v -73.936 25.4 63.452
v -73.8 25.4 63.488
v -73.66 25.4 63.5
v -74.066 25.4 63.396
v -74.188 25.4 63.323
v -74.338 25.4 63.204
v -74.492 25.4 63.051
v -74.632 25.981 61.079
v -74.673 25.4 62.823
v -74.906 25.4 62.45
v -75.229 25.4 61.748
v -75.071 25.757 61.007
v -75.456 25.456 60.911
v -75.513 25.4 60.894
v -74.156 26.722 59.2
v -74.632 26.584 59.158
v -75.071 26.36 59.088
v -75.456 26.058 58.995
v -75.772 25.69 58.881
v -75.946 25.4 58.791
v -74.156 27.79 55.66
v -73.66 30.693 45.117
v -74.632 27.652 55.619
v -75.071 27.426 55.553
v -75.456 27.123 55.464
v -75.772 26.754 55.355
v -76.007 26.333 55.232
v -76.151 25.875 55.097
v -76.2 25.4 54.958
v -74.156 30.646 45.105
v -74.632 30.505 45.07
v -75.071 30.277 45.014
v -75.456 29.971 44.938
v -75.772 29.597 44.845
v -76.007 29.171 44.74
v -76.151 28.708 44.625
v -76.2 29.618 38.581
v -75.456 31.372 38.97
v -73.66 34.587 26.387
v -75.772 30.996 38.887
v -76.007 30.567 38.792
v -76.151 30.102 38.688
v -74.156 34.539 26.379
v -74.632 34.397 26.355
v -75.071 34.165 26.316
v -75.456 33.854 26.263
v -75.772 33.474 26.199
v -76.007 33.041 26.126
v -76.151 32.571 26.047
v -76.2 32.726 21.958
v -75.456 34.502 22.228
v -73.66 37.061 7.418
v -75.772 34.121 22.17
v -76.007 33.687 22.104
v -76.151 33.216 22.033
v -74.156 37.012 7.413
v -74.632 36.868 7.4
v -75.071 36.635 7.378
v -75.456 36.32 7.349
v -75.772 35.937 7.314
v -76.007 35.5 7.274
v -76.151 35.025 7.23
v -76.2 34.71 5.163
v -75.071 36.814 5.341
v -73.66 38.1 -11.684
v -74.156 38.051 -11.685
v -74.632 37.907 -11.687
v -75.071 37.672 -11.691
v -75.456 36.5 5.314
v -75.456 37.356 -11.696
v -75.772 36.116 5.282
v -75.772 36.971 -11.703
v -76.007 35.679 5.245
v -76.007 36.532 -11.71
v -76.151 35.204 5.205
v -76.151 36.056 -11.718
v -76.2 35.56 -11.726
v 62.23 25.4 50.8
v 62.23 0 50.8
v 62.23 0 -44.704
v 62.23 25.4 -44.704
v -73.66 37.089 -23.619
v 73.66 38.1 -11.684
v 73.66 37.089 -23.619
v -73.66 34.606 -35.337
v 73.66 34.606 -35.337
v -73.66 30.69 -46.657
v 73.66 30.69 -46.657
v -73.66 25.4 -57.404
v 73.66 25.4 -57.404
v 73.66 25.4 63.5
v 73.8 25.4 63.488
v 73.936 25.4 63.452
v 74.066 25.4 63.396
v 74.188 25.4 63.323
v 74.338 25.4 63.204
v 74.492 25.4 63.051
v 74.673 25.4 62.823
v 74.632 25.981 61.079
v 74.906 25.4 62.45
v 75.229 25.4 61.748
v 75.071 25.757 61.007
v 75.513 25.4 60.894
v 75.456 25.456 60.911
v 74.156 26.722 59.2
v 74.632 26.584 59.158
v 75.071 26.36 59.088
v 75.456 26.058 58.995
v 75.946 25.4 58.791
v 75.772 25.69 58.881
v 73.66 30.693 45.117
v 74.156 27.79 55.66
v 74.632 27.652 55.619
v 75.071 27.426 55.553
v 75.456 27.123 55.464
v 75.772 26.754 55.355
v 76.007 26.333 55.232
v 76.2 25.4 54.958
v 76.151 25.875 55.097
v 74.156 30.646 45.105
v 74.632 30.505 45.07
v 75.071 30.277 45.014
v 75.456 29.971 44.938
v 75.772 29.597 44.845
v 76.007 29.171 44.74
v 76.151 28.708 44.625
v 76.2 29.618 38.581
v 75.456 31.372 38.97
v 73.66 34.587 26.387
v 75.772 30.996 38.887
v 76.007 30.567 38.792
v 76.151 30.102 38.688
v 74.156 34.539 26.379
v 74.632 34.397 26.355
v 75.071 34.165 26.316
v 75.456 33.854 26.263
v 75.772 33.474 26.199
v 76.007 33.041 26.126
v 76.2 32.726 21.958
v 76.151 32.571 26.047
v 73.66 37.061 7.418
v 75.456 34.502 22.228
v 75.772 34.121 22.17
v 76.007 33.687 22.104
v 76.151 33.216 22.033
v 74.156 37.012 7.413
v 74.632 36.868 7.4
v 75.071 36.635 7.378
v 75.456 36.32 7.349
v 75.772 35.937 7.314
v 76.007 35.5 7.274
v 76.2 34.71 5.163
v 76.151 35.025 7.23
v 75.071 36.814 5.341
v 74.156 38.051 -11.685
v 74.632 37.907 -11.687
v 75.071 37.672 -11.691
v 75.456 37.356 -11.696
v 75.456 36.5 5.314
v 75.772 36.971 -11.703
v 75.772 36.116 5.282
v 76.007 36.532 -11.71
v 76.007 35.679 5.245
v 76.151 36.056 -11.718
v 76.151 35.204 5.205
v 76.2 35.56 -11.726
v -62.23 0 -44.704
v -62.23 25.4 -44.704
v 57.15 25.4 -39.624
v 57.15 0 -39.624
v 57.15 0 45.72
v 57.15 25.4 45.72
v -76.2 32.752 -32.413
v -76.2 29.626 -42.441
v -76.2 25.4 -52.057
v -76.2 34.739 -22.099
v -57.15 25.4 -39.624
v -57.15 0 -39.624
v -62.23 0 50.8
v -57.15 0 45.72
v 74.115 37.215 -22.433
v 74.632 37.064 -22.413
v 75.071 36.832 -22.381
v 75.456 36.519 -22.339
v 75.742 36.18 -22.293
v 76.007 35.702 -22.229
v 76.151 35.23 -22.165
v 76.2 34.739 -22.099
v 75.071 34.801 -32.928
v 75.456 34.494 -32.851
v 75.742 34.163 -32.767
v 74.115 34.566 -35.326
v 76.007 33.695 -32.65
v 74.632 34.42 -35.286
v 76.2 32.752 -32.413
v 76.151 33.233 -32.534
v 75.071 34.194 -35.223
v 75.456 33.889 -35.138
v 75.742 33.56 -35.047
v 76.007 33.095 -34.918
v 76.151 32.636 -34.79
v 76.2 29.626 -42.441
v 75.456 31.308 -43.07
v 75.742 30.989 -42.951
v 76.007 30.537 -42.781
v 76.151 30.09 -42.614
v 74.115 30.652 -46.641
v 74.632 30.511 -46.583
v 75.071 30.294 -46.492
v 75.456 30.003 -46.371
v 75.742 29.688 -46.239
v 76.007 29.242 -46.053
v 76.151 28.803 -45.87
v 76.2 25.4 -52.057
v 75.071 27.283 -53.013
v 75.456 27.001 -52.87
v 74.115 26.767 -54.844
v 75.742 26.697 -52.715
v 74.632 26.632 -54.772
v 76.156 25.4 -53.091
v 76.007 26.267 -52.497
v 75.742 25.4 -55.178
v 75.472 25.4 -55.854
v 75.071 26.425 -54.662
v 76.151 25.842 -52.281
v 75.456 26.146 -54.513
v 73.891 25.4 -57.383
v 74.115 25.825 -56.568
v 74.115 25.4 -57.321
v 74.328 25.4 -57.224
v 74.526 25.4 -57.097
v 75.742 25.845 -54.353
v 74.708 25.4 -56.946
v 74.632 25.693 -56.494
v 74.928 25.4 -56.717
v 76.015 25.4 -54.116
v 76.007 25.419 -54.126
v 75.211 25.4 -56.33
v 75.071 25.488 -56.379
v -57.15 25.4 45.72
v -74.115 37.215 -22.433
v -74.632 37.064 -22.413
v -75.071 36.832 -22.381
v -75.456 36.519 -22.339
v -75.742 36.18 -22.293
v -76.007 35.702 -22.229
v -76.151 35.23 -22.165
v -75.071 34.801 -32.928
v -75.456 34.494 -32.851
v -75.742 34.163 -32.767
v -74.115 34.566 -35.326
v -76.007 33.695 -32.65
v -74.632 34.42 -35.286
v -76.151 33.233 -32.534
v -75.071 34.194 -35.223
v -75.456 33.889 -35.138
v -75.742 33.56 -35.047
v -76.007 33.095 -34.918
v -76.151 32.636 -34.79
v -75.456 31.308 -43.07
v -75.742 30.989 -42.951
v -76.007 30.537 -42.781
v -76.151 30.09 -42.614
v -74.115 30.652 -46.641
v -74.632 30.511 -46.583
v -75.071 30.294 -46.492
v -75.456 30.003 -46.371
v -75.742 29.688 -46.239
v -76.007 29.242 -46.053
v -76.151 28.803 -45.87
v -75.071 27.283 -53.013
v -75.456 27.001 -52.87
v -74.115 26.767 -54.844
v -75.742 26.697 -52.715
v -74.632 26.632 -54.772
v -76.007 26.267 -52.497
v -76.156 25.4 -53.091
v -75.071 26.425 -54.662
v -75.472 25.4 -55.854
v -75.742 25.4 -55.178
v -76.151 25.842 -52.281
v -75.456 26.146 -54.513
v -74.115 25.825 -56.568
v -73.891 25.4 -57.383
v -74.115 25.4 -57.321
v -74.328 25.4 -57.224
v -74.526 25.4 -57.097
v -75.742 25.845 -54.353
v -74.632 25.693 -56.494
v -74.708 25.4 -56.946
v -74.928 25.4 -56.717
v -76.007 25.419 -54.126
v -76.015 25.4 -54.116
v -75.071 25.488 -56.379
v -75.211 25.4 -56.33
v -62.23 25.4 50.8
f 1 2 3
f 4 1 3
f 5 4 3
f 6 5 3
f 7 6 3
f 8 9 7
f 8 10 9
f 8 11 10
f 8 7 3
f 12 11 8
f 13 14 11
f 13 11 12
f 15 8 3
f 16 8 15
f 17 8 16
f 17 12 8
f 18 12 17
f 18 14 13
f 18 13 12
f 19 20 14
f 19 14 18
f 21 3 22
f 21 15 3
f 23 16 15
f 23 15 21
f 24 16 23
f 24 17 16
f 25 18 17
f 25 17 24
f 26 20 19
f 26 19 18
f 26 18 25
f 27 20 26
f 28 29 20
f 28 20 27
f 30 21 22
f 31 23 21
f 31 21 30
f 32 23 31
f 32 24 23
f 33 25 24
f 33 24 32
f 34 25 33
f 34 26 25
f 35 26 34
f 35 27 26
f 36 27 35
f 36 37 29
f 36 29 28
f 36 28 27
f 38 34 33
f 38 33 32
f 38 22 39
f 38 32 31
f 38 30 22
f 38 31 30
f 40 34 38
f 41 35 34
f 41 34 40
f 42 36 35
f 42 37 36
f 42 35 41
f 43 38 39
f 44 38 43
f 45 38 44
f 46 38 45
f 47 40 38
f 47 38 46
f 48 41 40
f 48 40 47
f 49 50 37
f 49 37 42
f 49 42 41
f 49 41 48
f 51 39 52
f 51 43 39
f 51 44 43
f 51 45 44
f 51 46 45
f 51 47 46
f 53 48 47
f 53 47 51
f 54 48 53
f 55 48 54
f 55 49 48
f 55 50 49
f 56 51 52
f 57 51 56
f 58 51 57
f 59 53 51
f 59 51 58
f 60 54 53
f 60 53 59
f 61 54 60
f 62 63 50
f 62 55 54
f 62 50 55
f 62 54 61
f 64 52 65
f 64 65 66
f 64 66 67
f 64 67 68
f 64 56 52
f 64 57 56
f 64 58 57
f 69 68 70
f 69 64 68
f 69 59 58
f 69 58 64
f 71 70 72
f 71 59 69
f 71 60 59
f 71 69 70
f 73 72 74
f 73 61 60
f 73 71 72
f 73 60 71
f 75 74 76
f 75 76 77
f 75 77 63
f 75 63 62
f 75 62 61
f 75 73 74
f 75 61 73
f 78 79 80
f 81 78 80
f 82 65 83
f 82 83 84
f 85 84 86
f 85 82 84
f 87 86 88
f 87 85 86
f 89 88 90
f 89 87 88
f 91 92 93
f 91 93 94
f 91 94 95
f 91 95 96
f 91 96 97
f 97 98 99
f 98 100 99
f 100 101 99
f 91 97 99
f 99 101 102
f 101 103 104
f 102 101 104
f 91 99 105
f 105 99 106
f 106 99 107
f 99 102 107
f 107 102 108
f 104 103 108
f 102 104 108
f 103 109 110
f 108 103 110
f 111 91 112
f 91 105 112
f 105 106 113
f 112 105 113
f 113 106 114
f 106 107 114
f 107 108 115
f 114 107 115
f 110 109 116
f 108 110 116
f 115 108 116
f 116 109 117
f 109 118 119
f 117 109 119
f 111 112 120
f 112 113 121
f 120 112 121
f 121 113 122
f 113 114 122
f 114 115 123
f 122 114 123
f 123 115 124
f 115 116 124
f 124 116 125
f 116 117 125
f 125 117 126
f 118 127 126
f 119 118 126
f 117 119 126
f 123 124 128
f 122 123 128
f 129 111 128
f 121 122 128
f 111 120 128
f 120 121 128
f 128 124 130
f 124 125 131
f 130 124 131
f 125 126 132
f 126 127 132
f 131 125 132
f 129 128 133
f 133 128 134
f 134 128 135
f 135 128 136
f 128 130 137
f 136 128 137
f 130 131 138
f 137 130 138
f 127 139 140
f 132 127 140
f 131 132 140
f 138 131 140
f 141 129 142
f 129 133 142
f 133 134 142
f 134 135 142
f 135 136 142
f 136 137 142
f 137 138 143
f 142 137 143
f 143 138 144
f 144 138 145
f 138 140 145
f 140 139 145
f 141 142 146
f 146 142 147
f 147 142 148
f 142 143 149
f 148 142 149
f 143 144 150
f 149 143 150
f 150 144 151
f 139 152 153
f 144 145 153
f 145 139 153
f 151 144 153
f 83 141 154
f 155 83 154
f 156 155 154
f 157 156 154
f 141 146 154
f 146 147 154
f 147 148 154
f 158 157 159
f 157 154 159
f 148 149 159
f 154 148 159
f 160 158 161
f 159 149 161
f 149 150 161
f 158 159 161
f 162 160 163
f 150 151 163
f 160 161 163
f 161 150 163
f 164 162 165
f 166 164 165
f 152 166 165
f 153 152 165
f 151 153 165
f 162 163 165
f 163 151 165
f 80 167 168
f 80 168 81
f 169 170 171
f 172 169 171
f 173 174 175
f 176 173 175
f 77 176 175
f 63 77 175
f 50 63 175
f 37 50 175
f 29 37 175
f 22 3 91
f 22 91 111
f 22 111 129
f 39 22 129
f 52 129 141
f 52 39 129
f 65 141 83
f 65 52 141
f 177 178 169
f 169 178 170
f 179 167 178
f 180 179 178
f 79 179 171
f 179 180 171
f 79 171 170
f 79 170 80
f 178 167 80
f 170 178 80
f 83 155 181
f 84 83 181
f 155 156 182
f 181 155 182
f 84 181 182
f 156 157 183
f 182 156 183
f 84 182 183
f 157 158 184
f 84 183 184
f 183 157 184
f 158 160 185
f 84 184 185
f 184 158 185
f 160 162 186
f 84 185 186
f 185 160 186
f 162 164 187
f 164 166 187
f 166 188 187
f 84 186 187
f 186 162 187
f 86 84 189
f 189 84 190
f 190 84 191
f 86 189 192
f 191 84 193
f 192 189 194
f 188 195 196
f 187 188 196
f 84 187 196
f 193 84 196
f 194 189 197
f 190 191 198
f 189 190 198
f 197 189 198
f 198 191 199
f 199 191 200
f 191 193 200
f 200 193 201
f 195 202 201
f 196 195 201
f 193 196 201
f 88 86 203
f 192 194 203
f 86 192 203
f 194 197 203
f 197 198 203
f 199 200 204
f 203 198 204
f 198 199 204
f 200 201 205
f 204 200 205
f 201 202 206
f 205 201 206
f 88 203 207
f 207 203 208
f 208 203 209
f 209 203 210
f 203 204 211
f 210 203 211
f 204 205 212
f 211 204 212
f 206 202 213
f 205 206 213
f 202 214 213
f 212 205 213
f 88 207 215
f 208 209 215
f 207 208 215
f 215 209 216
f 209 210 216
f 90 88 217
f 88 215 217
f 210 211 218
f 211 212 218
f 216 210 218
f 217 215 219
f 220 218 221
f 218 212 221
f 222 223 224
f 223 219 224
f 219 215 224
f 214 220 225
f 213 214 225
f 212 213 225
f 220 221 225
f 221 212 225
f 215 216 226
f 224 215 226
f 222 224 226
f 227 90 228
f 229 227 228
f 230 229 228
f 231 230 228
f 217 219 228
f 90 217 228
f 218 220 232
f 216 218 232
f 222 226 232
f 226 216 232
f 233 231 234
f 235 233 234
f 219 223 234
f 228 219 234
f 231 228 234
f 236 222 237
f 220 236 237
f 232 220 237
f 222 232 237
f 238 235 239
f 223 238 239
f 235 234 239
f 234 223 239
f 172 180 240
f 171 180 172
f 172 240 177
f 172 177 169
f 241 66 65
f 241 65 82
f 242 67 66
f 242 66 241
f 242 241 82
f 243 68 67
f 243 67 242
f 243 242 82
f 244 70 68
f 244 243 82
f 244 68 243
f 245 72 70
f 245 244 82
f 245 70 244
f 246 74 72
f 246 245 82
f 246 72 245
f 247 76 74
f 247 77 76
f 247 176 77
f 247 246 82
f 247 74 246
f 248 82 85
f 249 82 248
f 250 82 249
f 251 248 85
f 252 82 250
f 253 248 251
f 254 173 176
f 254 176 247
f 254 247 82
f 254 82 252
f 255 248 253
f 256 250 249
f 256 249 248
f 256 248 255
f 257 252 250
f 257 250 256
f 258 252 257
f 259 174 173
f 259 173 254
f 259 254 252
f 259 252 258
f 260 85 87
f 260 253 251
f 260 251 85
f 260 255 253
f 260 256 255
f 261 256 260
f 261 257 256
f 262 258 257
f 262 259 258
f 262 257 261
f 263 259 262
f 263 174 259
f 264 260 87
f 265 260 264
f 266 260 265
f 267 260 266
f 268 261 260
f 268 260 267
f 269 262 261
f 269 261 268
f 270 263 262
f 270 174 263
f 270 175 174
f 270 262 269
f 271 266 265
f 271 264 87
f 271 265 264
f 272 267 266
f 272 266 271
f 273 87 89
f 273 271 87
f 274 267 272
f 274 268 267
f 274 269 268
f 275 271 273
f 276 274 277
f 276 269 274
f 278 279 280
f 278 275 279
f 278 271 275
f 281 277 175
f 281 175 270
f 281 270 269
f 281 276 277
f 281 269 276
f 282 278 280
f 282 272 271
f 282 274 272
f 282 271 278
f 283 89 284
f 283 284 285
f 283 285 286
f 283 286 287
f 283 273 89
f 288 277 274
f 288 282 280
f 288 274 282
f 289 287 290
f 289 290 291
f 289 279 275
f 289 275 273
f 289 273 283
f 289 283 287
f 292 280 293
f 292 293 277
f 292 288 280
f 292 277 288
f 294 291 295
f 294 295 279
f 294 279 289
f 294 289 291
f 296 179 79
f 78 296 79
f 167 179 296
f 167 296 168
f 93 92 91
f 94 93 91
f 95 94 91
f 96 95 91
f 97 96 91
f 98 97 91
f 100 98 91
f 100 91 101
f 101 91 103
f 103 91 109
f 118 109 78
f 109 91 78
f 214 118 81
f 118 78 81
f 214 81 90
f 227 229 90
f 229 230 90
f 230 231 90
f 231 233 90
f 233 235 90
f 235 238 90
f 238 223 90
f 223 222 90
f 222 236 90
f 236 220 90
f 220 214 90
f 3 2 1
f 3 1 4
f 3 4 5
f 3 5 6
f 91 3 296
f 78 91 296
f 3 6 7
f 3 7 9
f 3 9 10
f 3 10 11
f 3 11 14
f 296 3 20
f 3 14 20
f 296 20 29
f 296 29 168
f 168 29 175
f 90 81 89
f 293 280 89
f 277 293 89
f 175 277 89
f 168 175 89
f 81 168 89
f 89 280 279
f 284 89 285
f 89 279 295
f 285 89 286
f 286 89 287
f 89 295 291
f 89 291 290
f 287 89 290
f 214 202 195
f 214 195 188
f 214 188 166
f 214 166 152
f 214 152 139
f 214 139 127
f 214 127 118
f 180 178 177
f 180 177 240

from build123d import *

# Parameters (mm, degrees)
SKETCH1_W                = 124.46
SKETCH1_H                = 95.504
BOSS_EXTRUDE1_DEPTH      = 25.4
BOSS_EXTRUDE2_DEPTH      = 76.2
BOSS_EXTRUDE2_DEPTH_BACK = 76.2
SKETCH4_W                = 114.3
SKETCH4_H                = 85.344
CUT_EXTRUDE1_DEPTH       = 25.4
FILLET3_R                = 2.54


with BuildPart() as part:
    # Sketch1 → Boss-Extrude1 (new body)
    with BuildSketch(Plane(origin=(0, 0, 0), x_dir=(1, 0, 0), z_dir=(0, 1, 0))):
        with Locations((0, -3.048)):
            Rectangle(SKETCH1_W, SKETCH1_H)
    extrude(amount=BOSS_EXTRUDE1_DEPTH)

    # Sketch3 → Boss-Extrude2 (add, two sides: drawn at the far end of the back side and taken through both)
    with BuildSketch(Plane(origin=(0, 0, 0), x_dir=(0, 0, -1), z_dir=(1, 0, 0)).offset(-BOSS_EXTRUDE2_DEPTH_BACK)):
        with BuildLine():
            ThreePointArc((11.684, 38.1), (35.337321444, 34.605957197), (57.404, 25.4))
            Line((57.404, 25.4), (44.704, 25.4))
            Line((44.704, 25.4), (11.684, 25.4))
            Line((11.684, 25.4), (11.684, 38.1))
        make_face()
        with BuildLine():
            ThreePointArc((-63.5, 25.4), (-26.387271572, 34.587287709), (11.684, 38.1))
            Line((11.684, 38.1), (11.684, 25.4))
            Line((11.684, 25.4), (-50.8, 25.4))
            Line((-50.8, 25.4), (-63.5, 25.4))
        make_face()
    extrude(amount=BOSS_EXTRUDE2_DEPTH + BOSS_EXTRUDE2_DEPTH_BACK)

    # Sketch4 → Cut-Extrude1 (cut)
    with BuildSketch(Plane.XZ):
        with Locations((0, 3.048)):
            Rectangle(SKETCH4_W, SKETCH4_H)
    extrude(amount=-CUT_EXTRUDE1_DEPTH, mode=Mode.SUBTRACT)

    # Fillet3
    fillet3_edges = [part.edges().sort_by_distance(p)[0] for p in [
        (76.2, 34.605957197, -35.337321444),
        (76.2, 34.587287709, 26.387271572),
        (-76.2, 34.605957197, -35.337321444),
        (-76.2, 34.587287709, 26.387271572),
    ]]
    fillet(fillet3_edges, radius=FILLET3_R)


solid = part.part
